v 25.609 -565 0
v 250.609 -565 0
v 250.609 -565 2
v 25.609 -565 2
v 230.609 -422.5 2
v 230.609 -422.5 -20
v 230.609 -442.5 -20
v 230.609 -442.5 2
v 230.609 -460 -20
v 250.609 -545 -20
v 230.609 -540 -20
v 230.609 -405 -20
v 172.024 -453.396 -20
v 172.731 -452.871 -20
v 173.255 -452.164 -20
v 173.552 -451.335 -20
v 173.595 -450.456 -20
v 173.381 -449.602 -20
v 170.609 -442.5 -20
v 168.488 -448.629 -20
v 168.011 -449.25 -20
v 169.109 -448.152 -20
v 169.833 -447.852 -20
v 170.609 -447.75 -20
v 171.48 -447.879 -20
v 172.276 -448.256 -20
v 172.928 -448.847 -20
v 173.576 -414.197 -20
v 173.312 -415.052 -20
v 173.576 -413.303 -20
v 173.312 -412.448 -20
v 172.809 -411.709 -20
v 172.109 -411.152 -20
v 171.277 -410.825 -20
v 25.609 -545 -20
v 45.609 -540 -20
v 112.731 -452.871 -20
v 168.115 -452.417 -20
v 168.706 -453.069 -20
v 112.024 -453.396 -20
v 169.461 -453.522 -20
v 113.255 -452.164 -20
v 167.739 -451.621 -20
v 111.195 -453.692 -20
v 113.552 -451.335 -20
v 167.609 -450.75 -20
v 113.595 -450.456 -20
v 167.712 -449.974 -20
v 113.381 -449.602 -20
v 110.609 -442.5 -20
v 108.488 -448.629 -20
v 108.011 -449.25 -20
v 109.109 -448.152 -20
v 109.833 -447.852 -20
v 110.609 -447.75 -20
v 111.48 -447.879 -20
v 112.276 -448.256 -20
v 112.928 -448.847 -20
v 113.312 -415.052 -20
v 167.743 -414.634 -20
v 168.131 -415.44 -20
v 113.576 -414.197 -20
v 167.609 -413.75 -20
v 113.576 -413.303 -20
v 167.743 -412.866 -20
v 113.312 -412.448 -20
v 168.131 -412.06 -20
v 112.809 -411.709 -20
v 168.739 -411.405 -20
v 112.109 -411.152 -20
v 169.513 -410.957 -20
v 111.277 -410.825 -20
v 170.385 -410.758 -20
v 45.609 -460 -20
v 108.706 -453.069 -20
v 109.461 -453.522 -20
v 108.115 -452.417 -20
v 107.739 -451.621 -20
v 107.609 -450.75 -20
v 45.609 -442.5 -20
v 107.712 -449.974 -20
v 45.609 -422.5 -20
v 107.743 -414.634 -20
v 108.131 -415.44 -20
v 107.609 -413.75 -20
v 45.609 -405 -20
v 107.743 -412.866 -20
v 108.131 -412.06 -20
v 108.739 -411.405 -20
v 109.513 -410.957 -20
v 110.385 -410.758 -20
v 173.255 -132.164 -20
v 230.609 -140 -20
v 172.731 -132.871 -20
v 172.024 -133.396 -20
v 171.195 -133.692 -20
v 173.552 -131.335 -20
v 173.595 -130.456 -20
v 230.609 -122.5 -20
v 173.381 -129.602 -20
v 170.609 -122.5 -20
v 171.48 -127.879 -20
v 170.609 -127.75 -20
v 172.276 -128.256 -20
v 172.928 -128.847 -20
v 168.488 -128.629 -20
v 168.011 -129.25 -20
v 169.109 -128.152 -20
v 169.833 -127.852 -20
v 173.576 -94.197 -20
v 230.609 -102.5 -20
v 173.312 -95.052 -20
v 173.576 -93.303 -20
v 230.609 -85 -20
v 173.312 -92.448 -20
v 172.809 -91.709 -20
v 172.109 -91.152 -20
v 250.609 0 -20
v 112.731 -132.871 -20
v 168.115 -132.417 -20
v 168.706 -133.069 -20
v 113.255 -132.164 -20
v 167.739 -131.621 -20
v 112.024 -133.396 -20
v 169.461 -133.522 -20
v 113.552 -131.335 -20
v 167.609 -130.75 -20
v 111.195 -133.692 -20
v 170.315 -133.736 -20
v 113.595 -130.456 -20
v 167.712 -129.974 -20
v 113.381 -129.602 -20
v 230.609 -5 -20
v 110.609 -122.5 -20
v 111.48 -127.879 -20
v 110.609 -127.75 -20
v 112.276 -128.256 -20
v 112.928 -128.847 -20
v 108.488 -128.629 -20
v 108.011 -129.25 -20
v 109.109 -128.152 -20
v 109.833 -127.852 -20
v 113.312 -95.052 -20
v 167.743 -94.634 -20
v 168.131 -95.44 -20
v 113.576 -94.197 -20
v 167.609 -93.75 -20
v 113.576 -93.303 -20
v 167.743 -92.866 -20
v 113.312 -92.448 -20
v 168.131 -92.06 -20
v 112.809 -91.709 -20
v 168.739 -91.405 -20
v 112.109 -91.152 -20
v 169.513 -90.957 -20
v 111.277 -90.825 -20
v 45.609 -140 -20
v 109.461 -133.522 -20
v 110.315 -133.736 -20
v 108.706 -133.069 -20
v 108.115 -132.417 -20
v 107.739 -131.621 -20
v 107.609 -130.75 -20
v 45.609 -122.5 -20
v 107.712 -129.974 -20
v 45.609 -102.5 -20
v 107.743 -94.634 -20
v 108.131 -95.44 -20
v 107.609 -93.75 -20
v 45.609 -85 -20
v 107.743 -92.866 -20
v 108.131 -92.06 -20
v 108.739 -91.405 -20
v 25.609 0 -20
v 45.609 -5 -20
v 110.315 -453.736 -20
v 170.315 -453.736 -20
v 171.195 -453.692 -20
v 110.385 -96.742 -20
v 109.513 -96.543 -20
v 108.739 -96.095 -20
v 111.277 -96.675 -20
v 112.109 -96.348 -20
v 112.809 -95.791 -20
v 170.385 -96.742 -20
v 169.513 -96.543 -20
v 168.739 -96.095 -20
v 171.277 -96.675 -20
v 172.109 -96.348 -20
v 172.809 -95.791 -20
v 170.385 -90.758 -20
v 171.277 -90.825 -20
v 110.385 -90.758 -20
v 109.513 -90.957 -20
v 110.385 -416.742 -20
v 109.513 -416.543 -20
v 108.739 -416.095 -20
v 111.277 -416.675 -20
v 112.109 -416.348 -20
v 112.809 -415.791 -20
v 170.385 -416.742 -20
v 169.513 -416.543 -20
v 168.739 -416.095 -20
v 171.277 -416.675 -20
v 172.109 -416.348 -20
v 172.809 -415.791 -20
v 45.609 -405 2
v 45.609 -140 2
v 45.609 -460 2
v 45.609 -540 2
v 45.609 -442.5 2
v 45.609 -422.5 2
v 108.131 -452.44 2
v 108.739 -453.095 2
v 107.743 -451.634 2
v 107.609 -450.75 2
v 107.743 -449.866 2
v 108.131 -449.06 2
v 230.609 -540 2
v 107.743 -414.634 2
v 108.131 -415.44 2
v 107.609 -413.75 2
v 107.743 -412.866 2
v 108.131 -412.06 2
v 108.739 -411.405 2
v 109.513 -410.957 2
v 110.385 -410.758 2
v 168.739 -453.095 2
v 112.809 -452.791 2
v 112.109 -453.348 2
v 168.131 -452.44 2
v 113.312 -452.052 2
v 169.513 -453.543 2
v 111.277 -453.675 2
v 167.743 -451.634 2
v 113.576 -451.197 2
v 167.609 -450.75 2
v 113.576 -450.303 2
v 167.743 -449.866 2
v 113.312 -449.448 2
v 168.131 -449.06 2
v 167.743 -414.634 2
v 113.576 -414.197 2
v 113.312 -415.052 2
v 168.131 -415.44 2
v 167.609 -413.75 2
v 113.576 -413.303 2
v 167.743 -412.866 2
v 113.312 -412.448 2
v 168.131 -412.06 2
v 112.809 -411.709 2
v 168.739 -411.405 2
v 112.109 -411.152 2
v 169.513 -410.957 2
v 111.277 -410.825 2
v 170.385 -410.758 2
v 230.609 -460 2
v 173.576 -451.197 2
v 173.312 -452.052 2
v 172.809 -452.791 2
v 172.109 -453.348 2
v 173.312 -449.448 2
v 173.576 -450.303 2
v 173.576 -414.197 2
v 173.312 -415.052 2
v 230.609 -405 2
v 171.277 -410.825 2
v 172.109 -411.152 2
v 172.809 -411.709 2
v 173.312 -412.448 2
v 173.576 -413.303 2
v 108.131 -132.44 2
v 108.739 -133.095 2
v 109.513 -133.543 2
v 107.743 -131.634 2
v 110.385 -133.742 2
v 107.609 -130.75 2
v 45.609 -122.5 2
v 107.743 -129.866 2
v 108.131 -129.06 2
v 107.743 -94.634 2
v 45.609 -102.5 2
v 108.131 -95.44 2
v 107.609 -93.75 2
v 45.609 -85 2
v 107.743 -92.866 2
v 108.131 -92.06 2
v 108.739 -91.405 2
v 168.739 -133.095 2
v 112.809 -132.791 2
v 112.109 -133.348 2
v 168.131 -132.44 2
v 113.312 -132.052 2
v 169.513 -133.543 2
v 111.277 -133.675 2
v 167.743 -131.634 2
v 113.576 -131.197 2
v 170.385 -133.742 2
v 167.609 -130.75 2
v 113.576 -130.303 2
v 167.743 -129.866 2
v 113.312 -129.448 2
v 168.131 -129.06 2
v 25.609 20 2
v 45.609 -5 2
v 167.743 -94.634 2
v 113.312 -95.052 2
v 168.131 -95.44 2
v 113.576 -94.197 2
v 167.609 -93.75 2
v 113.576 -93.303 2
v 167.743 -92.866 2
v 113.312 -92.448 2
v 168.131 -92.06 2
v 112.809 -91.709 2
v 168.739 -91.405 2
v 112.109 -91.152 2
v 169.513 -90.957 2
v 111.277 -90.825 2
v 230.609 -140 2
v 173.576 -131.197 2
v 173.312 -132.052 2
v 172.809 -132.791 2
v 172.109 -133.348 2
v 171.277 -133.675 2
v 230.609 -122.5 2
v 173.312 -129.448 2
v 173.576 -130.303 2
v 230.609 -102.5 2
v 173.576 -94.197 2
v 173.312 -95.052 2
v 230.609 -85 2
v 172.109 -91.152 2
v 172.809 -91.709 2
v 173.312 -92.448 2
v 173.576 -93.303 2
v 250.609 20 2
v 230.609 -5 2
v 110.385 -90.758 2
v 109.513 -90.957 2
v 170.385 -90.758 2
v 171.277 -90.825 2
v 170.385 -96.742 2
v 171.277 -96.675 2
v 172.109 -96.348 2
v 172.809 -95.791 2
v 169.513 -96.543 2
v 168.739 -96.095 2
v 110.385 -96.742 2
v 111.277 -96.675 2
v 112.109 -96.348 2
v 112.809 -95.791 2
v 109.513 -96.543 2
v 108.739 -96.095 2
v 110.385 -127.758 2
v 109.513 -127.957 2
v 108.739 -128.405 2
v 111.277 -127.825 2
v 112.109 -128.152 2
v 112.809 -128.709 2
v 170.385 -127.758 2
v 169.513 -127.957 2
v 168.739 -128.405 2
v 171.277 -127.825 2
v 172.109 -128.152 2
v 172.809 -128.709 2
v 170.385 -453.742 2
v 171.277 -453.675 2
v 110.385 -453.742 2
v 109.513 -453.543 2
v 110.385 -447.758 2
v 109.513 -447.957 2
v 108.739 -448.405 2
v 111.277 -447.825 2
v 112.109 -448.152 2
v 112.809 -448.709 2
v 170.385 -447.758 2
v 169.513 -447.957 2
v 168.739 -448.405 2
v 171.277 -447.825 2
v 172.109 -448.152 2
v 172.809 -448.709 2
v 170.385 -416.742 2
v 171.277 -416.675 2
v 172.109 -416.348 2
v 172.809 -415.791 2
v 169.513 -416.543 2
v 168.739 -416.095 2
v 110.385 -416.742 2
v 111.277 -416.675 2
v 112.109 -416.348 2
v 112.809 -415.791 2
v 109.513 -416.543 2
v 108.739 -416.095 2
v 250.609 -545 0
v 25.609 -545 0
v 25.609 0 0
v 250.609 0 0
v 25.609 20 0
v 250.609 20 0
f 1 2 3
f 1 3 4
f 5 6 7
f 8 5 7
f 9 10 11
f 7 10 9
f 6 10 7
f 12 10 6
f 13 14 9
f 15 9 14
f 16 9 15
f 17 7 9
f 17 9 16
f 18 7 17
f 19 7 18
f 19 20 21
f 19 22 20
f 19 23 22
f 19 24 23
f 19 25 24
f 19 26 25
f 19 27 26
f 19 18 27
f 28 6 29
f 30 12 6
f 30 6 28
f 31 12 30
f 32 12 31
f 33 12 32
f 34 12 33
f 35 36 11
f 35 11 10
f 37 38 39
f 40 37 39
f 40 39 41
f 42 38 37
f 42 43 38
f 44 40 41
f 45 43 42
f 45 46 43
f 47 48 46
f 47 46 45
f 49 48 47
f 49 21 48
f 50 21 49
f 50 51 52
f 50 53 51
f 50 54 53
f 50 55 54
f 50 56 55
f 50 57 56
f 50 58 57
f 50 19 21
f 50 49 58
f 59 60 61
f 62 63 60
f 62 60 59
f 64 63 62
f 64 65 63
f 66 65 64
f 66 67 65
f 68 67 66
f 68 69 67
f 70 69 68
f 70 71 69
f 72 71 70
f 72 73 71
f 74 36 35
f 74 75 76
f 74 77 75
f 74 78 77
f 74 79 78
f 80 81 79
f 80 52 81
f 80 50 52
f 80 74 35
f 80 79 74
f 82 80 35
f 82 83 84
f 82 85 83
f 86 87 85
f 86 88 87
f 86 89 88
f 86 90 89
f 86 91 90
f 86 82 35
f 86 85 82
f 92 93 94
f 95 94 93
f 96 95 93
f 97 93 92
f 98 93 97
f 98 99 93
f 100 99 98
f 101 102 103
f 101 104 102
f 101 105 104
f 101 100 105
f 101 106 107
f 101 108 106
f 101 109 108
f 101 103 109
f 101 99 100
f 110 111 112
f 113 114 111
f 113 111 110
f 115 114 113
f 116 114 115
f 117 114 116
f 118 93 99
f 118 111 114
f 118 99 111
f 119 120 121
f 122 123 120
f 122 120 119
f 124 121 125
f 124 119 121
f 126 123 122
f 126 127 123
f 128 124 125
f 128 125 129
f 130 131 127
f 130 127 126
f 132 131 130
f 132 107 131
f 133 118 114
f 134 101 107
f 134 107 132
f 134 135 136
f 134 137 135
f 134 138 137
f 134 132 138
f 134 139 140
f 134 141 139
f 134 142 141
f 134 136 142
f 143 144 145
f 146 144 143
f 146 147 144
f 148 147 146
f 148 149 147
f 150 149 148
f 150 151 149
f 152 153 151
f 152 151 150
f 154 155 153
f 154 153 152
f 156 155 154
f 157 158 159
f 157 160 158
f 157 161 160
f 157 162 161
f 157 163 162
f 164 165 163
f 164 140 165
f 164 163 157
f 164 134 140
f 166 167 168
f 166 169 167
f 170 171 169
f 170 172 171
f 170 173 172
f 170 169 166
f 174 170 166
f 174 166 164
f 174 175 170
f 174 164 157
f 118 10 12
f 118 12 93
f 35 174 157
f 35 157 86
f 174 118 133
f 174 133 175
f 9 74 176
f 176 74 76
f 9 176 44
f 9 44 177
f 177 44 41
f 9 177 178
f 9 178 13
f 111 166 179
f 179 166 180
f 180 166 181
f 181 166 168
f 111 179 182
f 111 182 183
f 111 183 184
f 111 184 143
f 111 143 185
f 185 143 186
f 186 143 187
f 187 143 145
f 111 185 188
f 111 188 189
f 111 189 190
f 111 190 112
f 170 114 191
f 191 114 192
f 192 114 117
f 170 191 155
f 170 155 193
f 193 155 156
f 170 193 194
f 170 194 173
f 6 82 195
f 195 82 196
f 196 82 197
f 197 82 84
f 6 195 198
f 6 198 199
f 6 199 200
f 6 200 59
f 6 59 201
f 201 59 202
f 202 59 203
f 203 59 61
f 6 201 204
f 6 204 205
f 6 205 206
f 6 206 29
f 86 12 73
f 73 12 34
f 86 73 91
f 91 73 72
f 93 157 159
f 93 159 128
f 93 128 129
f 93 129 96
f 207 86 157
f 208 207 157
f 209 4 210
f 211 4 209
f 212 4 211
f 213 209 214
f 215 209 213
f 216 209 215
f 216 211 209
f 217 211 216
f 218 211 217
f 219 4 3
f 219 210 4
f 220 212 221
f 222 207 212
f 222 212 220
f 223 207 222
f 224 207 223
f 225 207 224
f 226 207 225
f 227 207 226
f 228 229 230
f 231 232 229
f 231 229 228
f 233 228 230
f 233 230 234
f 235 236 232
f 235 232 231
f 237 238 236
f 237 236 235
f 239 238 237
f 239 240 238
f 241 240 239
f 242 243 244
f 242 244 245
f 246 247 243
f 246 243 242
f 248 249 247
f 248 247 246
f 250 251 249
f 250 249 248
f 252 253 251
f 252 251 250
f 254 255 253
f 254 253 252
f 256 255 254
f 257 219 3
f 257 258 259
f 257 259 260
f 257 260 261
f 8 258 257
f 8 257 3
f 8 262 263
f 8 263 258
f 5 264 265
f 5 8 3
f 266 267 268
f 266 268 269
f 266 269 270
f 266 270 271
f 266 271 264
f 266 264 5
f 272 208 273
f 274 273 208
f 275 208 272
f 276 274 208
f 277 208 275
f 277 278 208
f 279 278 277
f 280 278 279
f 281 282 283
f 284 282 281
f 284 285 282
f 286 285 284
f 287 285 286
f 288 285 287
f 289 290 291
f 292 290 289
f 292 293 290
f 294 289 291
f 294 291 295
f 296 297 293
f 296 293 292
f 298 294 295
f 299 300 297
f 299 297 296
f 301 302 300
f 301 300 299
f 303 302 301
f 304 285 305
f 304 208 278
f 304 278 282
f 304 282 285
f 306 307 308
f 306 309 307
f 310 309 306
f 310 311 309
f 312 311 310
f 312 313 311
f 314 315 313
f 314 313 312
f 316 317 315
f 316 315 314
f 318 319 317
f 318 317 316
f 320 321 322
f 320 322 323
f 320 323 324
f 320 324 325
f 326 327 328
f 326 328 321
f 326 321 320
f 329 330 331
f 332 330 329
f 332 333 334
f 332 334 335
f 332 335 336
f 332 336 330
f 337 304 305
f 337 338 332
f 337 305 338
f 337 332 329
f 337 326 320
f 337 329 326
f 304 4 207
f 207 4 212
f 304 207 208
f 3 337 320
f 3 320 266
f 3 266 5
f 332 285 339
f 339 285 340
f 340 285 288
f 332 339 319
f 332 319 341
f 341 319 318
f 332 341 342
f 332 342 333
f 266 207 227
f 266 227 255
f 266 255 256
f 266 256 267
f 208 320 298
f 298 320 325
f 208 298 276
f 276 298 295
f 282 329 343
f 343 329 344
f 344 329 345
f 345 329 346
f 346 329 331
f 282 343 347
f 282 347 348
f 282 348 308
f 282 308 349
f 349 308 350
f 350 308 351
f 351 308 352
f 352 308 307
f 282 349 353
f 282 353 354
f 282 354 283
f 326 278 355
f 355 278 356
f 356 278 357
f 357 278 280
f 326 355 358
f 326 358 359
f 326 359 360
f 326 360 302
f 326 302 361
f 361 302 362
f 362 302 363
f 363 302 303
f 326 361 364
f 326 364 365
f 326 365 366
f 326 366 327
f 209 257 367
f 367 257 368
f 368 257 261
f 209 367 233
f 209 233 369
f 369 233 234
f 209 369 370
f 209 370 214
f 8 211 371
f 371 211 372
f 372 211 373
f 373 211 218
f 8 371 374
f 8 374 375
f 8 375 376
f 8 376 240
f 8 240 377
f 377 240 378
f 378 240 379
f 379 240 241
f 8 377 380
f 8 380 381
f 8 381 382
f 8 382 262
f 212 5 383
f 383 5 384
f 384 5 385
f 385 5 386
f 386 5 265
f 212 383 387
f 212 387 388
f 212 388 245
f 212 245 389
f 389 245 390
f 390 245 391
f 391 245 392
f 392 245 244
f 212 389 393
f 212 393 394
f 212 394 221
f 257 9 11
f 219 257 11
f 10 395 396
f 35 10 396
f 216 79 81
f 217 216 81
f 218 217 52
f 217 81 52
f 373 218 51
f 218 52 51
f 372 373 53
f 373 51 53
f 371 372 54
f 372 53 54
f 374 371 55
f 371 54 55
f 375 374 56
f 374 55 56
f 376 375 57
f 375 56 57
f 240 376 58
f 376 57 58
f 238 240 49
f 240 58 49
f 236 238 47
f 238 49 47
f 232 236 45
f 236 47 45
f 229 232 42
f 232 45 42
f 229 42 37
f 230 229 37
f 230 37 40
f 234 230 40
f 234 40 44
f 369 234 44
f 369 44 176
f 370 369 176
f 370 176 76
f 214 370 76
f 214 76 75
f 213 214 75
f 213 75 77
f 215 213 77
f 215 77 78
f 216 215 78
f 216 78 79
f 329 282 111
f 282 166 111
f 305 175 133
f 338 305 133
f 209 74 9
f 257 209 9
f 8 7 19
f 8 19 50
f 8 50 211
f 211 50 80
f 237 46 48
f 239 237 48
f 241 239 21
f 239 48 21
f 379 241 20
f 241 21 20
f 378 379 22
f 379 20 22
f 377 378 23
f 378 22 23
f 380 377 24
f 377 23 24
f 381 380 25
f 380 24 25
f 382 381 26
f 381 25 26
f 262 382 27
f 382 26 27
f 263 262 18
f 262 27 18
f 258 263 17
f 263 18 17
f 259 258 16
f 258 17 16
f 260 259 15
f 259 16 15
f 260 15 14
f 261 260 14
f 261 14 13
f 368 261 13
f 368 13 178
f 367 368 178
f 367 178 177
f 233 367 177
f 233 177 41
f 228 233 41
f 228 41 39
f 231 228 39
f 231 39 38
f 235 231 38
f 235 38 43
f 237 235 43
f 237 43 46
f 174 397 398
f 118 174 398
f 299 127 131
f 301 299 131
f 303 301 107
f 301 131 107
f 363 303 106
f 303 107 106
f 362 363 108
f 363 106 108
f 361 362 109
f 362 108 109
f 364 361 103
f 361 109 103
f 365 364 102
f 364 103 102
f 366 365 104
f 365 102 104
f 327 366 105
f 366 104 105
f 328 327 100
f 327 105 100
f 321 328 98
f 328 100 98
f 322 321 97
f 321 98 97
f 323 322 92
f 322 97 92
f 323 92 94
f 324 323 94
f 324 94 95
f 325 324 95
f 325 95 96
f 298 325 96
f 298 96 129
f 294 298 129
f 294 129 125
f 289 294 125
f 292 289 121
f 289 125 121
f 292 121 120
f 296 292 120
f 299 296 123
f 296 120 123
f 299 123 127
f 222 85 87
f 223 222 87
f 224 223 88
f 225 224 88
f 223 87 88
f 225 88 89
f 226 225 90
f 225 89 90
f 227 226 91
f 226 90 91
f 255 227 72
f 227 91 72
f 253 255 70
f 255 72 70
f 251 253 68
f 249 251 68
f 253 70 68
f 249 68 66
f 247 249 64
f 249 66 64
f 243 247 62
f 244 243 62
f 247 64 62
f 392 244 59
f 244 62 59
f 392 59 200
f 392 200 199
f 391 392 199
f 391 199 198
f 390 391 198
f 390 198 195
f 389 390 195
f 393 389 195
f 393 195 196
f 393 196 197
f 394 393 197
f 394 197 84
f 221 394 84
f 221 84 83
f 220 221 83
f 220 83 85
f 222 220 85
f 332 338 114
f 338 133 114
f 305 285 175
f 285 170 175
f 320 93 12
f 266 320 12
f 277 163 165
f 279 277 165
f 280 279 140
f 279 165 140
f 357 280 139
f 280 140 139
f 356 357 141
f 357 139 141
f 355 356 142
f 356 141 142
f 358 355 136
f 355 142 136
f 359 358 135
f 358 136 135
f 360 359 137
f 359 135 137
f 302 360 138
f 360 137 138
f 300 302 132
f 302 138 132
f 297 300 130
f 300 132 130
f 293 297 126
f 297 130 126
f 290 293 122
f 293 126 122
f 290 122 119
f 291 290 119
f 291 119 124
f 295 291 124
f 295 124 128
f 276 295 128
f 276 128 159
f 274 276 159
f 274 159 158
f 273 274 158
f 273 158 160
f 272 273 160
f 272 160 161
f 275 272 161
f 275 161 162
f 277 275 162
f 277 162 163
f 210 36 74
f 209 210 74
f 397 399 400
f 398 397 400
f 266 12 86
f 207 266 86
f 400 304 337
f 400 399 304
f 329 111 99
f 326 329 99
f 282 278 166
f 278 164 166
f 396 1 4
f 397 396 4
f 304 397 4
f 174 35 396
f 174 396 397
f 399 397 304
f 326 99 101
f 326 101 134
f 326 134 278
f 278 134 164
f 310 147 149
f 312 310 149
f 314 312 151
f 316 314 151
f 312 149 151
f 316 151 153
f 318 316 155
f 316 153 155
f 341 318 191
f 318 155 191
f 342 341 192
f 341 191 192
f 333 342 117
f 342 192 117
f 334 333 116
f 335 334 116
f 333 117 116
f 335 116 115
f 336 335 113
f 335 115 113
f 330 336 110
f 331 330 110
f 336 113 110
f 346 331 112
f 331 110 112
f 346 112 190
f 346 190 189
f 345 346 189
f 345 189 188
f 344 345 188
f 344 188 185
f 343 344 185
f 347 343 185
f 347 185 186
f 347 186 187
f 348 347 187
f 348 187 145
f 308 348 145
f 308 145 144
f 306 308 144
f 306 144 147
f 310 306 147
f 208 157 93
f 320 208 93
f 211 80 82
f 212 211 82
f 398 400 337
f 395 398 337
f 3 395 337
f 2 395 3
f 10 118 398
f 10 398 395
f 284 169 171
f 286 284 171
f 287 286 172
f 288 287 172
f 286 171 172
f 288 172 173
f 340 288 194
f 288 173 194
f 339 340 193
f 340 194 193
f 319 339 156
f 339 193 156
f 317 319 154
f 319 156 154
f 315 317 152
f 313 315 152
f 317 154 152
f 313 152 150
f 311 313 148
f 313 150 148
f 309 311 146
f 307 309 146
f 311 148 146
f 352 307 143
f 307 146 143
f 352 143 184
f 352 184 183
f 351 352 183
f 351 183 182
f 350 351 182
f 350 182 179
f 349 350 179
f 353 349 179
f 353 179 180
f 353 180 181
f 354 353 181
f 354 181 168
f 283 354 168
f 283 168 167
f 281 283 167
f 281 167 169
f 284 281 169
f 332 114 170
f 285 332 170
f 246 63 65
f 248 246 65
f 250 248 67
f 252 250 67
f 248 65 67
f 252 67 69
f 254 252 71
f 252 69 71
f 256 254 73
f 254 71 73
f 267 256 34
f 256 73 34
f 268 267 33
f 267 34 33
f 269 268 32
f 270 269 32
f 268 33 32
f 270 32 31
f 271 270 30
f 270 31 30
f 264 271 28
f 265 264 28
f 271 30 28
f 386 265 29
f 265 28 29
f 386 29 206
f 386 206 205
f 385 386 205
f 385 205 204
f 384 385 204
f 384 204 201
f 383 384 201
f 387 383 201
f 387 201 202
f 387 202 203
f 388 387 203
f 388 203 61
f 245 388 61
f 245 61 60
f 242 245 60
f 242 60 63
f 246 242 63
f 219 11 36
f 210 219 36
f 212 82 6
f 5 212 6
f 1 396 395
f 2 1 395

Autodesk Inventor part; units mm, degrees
ref_plane "YZ Plane" through (0, 0, 0) normal (1, 0, 0) x (0, 1, 0)
ref_plane "XZ Plane" through (0, 0, 0) normal (0, 1, 0) x (-1, 0, 0)
ref_plane "XY Plane" through (0, 0, 0) normal (0, 0, 1) x (1, 0, 0)
sketch "草圖1" plane through (0, 0, 0) normal (0, 0, 1) x (1, 0, 0)
  line L0 (0, 0) -> (25, 0)
  line L1 (25.6094, 0) -> (25.6094, 20)
  line L2 (25.6094, 20) -> (250.6094, 20)
  line L3 (250.6094, 20) -> (250.6094, -565)
  line L4 (250.6094, -565) -> (25.6094, -565)
  line L5 (25.6094, -565) -> (25.6094, 20)
  line L6 (25.6094, 0) -> (25.6094, -5)
  line L7 (45.6094, -5) -> (230.6094, -5)
  line L8 (230.6094, -5) -> (230.6094, -85)
  line L9 (230.6094, -85) -> (45.6094, -85)
  line L10 (45.6094, -85) -> (45.6094, -5)
  line L11 (45.6094, -102.5) -> (230.6094, -102.5)
  line L12 (230.6094, -102.5) -> (230.6094, -122.5)
  line L13 (230.6094, -122.5) -> (45.6094, -122.5)
  line L14 (45.6094, -122.5) -> (45.6094, -102.5)
  line L15 (45.6094, -140) -> (230.6094, -140)
  line L16 (230.6094, -140) -> (230.6094, -405)
  line L17 (230.6094, -405) -> (45.6094, -405)
  line L18 (45.6094, -405) -> (45.6094, -140)
  line L19 (45.6094, -422.5) -> (230.6094, -422.5)
  line L20 (230.6094, -422.5) -> (230.6094, -442.5)
  line L21 (230.6094, -442.5) -> (45.6094, -442.5)
  line L22 (45.6094, -442.5) -> (45.6094, -422.5)
  line L23 (45.6094, -460) -> (230.6094, -460)
  line L24 (230.6094, -460) -> (230.6094, -540)
  line L25 (230.6094, -540) -> (45.6094, -540)
  line L26 (45.6094, -540) -> (45.6094, -460)
  dimension "d0" = 25
  dimension "d1" = 20
  dimension "d2" = 225
  dimension "d3" = 585
  dimension "d4" = 5
  dimension "d6" = 20
  dimension "d9" = 185
  dimension "d10" = 80
  dimension "d11" = 185
  dimension "d13" = 185
  dimension "d14" = 20
  dimension "d16" = 185
  dimension "d17" = 265
  dimension "d19" = 185
  dimension "d20" = 20
  dimension "d22" = 185
  dimension "d23" = 80
extrude "擠出1" add sketch "草圖1" along normal blind 2
sketch "草圖2" plane through (0, 0, 0) normal (0, 0, -1) x (-1, 0, 0)
  line L0 (-250.6094, -565) -> (-250.6094, 20) projected
  line L1 (-250.6094, -565) -> (-250.6094, -545)
  line L2 (-25.6094, 20) -> (-25.6094, -565) projected
  line L3 (-250.6094, -545) -> (-25.6094, -545)
  line L4 (-25.6094, -545) -> (-25.6094, 0)
  line L5 (-25.6094, 0) -> (-250.6094, 0)
  line L6 (-250.6094, 0) -> (-250.6094, -545)
  line L7 (-230.6094, -460) -> (-230.6094, -540) projected
  line L8 (-45.6094, -540) -> (-45.6094, -460) projected
  line L9 (-230.6094, -540) -> (-45.6094, -540)
  line L10 (-45.6094, -540) -> (-45.6094, -460)
  line L11 (-45.6094, -460) -> (-230.6094, -460)
  line L12 (-230.6094, -460) -> (-230.6094, -540)
  line L13 (-230.6094, -442.5) -> (-45.6094, -442.5) projected
  line L14 (-230.6094, -442.5) -> (-45.6094, -442.5)
  line L15 (-45.6094, -442.5) -> (-45.6094, -422.5)
  line L16 (-45.6094, -422.5) -> (-230.6094, -422.5)
  line L17 (-230.6094, -422.5) -> (-230.6094, -442.5)
  line L18 (-230.6094, -405) -> (-45.6094, -405) projected
  line L19 (-230.6094, -405) -> (-45.6094, -405)
  line L20 (-45.6094, -405) -> (-45.6094, -140)
  line L21 (-45.6094, -140) -> (-230.6094, -140)
  line L22 (-230.6094, -140) -> (-230.6094, -405)
  line L23 (-230.6094, -122.5) -> (-45.6094, -122.5) projected
  line L24 (-45.6094, -102.5) -> (-230.6094, -102.5) projected
  line L25 (-230.6094, -122.5) -> (-45.6094, -122.5)
  line L26 (-45.6094, -122.5) -> (-45.6094, -102.5)
  line L27 (-45.6094, -102.5) -> (-230.6094, -102.5)
  line L28 (-230.6094, -102.5) -> (-230.6094, -122.5)
  line L29 (-230.6094, -85) -> (-45.6094, -85) projected
  line L30 (-45.6094, -5) -> (-230.6094, -5) projected
  line L31 (-230.6094, -85) -> (-45.6094, -85)
  line L32 (-45.6094, -85) -> (-45.6094, -5)
  line L33 (-45.6094, -5) -> (-230.6094, -5)
  line L34 (-230.6094, -5) -> (-230.6094, -85)
  circle A0 centre (-25.6094, -102.5) radius 8.75
  line L35 (-25.6094, 20) -> (-25.6094, -565) projected
  circle A1 centre (-25.6094, -93.75) radius 85
  circle A2 centre (-25.6094, -93.75) radius 145
  circle A3 centre (-170.6094, -93.75) radius 3
  circle A4 centre (-110.6094, -93.75) radius 3
  line L36 (-170.6094, -93.75) -> (-170.6094, -130.75)
  line L37 (-110.6094, -93.75) -> (-110.6094, -130.75)
  circle A5 centre (-110.6094, -130.75) radius 3
  circle A6 centre (-170.6094, -130.75) radius 3
  circle A7 centre (-25.6094, -422.5) radius 8.75
  circle A8 centre (-25.6094, -413.75) radius 85
  circle A9 centre (-25.6094, -413.75) radius 145
  circle A10 centre (-170.6094, -413.75) radius 3
  circle A11 centre (-110.6094, -413.75) radius 3
  line L38 (-110.6094, -413.75) -> (-110.6094, -450.75)
  line L39 (-170.6094, -413.75) -> (-170.6094, -450.75)
  circle A12 centre (-170.6094, -450.75) radius 3
  circle A13 centre (-110.6094, -450.75) radius 3
  point P0 (0, 0)
  dimension "d33" = 17.5
  dimension "d34" = 170
  dimension "d35" = 290
  dimension "d42" = 17.5
  dimension "d43" = 170
  dimension "d44" = 290
  dimension "d26" = 20
  dimension "d27" = 185
  dimension "d28" = 20
  dimension "d29" = 185
  dimension "d30" = 265
  dimension "d36" = 6
  dimension "d37" = 6
  dimension "d38" = 37
  dimension "d39" = 37
  dimension "d40" = 6
  dimension "d41" = 6
  dimension "d45" = 6
  dimension "d46" = 6
  dimension "d47" = 37
  dimension "d48" = 6
  dimension "d49" = 6
extrude "擠出2" add sketch "草圖2" along normal blind 20 contours A12 | A6 | L0 L5 A2 L30 L34 L29 A3 L36 L24 L28 L23 L21 L22 L18 A9 A10 L39 L16 L17 L13 L11 L7 L9 L3 | A9 L9 L8 A8 L2 L3 | L5 L2 A1 L32 L30 A2 | A8 L8 L11 L13 L15 L16 A11 L18 L20 L2 A7 | A13 | A9 L13 A8 L11 | L2 A0 A1 L20 L21 L23 L26 L24 A4 L29 L32 | A2 L20 A1 L2 | L2 A9 L20 A2 | L29 A1 A4 L37 L24 A2 A3 | A7 L2 | L2 A8 L20 A9 | L2 A0 | A3 A2 | A2 L36 A3 | A9 A10 L18 A8 A11 L38 L16 | L16 L39 A10 A9 | A5 | A2 L23 A1 L21 | A4 A1 | A1 L37 A4 | A2 A3 L36 | A3 A2 L24 L36 | L16 L38 A11 A8 | A10 L39 A9 | A9 A10 | A1 A4 L37 | A4 A1 L24 L37 | A11 L38 A8 | A8 A11 | A10 A9 L39 | A11 A8 L38 picked at (-27.5435, -424.6832) picked at (-30.39, -103.7836)
extrude "擠出3" cut sketch "草圖2" along normal through all both and the other way through all contours A12 | A6 | A13 | A3 A2 | A2 L36 A3 | A5 | A4 A1 | A1 L37 A4 | A2 A3 L36 | A10 L39 A9 | A9 A10 | A1 A4 L37 | A11 L38 A8 | A8 A11 | A10 A9 L39 | A11 A8 L38
properties part number "DOF10"
